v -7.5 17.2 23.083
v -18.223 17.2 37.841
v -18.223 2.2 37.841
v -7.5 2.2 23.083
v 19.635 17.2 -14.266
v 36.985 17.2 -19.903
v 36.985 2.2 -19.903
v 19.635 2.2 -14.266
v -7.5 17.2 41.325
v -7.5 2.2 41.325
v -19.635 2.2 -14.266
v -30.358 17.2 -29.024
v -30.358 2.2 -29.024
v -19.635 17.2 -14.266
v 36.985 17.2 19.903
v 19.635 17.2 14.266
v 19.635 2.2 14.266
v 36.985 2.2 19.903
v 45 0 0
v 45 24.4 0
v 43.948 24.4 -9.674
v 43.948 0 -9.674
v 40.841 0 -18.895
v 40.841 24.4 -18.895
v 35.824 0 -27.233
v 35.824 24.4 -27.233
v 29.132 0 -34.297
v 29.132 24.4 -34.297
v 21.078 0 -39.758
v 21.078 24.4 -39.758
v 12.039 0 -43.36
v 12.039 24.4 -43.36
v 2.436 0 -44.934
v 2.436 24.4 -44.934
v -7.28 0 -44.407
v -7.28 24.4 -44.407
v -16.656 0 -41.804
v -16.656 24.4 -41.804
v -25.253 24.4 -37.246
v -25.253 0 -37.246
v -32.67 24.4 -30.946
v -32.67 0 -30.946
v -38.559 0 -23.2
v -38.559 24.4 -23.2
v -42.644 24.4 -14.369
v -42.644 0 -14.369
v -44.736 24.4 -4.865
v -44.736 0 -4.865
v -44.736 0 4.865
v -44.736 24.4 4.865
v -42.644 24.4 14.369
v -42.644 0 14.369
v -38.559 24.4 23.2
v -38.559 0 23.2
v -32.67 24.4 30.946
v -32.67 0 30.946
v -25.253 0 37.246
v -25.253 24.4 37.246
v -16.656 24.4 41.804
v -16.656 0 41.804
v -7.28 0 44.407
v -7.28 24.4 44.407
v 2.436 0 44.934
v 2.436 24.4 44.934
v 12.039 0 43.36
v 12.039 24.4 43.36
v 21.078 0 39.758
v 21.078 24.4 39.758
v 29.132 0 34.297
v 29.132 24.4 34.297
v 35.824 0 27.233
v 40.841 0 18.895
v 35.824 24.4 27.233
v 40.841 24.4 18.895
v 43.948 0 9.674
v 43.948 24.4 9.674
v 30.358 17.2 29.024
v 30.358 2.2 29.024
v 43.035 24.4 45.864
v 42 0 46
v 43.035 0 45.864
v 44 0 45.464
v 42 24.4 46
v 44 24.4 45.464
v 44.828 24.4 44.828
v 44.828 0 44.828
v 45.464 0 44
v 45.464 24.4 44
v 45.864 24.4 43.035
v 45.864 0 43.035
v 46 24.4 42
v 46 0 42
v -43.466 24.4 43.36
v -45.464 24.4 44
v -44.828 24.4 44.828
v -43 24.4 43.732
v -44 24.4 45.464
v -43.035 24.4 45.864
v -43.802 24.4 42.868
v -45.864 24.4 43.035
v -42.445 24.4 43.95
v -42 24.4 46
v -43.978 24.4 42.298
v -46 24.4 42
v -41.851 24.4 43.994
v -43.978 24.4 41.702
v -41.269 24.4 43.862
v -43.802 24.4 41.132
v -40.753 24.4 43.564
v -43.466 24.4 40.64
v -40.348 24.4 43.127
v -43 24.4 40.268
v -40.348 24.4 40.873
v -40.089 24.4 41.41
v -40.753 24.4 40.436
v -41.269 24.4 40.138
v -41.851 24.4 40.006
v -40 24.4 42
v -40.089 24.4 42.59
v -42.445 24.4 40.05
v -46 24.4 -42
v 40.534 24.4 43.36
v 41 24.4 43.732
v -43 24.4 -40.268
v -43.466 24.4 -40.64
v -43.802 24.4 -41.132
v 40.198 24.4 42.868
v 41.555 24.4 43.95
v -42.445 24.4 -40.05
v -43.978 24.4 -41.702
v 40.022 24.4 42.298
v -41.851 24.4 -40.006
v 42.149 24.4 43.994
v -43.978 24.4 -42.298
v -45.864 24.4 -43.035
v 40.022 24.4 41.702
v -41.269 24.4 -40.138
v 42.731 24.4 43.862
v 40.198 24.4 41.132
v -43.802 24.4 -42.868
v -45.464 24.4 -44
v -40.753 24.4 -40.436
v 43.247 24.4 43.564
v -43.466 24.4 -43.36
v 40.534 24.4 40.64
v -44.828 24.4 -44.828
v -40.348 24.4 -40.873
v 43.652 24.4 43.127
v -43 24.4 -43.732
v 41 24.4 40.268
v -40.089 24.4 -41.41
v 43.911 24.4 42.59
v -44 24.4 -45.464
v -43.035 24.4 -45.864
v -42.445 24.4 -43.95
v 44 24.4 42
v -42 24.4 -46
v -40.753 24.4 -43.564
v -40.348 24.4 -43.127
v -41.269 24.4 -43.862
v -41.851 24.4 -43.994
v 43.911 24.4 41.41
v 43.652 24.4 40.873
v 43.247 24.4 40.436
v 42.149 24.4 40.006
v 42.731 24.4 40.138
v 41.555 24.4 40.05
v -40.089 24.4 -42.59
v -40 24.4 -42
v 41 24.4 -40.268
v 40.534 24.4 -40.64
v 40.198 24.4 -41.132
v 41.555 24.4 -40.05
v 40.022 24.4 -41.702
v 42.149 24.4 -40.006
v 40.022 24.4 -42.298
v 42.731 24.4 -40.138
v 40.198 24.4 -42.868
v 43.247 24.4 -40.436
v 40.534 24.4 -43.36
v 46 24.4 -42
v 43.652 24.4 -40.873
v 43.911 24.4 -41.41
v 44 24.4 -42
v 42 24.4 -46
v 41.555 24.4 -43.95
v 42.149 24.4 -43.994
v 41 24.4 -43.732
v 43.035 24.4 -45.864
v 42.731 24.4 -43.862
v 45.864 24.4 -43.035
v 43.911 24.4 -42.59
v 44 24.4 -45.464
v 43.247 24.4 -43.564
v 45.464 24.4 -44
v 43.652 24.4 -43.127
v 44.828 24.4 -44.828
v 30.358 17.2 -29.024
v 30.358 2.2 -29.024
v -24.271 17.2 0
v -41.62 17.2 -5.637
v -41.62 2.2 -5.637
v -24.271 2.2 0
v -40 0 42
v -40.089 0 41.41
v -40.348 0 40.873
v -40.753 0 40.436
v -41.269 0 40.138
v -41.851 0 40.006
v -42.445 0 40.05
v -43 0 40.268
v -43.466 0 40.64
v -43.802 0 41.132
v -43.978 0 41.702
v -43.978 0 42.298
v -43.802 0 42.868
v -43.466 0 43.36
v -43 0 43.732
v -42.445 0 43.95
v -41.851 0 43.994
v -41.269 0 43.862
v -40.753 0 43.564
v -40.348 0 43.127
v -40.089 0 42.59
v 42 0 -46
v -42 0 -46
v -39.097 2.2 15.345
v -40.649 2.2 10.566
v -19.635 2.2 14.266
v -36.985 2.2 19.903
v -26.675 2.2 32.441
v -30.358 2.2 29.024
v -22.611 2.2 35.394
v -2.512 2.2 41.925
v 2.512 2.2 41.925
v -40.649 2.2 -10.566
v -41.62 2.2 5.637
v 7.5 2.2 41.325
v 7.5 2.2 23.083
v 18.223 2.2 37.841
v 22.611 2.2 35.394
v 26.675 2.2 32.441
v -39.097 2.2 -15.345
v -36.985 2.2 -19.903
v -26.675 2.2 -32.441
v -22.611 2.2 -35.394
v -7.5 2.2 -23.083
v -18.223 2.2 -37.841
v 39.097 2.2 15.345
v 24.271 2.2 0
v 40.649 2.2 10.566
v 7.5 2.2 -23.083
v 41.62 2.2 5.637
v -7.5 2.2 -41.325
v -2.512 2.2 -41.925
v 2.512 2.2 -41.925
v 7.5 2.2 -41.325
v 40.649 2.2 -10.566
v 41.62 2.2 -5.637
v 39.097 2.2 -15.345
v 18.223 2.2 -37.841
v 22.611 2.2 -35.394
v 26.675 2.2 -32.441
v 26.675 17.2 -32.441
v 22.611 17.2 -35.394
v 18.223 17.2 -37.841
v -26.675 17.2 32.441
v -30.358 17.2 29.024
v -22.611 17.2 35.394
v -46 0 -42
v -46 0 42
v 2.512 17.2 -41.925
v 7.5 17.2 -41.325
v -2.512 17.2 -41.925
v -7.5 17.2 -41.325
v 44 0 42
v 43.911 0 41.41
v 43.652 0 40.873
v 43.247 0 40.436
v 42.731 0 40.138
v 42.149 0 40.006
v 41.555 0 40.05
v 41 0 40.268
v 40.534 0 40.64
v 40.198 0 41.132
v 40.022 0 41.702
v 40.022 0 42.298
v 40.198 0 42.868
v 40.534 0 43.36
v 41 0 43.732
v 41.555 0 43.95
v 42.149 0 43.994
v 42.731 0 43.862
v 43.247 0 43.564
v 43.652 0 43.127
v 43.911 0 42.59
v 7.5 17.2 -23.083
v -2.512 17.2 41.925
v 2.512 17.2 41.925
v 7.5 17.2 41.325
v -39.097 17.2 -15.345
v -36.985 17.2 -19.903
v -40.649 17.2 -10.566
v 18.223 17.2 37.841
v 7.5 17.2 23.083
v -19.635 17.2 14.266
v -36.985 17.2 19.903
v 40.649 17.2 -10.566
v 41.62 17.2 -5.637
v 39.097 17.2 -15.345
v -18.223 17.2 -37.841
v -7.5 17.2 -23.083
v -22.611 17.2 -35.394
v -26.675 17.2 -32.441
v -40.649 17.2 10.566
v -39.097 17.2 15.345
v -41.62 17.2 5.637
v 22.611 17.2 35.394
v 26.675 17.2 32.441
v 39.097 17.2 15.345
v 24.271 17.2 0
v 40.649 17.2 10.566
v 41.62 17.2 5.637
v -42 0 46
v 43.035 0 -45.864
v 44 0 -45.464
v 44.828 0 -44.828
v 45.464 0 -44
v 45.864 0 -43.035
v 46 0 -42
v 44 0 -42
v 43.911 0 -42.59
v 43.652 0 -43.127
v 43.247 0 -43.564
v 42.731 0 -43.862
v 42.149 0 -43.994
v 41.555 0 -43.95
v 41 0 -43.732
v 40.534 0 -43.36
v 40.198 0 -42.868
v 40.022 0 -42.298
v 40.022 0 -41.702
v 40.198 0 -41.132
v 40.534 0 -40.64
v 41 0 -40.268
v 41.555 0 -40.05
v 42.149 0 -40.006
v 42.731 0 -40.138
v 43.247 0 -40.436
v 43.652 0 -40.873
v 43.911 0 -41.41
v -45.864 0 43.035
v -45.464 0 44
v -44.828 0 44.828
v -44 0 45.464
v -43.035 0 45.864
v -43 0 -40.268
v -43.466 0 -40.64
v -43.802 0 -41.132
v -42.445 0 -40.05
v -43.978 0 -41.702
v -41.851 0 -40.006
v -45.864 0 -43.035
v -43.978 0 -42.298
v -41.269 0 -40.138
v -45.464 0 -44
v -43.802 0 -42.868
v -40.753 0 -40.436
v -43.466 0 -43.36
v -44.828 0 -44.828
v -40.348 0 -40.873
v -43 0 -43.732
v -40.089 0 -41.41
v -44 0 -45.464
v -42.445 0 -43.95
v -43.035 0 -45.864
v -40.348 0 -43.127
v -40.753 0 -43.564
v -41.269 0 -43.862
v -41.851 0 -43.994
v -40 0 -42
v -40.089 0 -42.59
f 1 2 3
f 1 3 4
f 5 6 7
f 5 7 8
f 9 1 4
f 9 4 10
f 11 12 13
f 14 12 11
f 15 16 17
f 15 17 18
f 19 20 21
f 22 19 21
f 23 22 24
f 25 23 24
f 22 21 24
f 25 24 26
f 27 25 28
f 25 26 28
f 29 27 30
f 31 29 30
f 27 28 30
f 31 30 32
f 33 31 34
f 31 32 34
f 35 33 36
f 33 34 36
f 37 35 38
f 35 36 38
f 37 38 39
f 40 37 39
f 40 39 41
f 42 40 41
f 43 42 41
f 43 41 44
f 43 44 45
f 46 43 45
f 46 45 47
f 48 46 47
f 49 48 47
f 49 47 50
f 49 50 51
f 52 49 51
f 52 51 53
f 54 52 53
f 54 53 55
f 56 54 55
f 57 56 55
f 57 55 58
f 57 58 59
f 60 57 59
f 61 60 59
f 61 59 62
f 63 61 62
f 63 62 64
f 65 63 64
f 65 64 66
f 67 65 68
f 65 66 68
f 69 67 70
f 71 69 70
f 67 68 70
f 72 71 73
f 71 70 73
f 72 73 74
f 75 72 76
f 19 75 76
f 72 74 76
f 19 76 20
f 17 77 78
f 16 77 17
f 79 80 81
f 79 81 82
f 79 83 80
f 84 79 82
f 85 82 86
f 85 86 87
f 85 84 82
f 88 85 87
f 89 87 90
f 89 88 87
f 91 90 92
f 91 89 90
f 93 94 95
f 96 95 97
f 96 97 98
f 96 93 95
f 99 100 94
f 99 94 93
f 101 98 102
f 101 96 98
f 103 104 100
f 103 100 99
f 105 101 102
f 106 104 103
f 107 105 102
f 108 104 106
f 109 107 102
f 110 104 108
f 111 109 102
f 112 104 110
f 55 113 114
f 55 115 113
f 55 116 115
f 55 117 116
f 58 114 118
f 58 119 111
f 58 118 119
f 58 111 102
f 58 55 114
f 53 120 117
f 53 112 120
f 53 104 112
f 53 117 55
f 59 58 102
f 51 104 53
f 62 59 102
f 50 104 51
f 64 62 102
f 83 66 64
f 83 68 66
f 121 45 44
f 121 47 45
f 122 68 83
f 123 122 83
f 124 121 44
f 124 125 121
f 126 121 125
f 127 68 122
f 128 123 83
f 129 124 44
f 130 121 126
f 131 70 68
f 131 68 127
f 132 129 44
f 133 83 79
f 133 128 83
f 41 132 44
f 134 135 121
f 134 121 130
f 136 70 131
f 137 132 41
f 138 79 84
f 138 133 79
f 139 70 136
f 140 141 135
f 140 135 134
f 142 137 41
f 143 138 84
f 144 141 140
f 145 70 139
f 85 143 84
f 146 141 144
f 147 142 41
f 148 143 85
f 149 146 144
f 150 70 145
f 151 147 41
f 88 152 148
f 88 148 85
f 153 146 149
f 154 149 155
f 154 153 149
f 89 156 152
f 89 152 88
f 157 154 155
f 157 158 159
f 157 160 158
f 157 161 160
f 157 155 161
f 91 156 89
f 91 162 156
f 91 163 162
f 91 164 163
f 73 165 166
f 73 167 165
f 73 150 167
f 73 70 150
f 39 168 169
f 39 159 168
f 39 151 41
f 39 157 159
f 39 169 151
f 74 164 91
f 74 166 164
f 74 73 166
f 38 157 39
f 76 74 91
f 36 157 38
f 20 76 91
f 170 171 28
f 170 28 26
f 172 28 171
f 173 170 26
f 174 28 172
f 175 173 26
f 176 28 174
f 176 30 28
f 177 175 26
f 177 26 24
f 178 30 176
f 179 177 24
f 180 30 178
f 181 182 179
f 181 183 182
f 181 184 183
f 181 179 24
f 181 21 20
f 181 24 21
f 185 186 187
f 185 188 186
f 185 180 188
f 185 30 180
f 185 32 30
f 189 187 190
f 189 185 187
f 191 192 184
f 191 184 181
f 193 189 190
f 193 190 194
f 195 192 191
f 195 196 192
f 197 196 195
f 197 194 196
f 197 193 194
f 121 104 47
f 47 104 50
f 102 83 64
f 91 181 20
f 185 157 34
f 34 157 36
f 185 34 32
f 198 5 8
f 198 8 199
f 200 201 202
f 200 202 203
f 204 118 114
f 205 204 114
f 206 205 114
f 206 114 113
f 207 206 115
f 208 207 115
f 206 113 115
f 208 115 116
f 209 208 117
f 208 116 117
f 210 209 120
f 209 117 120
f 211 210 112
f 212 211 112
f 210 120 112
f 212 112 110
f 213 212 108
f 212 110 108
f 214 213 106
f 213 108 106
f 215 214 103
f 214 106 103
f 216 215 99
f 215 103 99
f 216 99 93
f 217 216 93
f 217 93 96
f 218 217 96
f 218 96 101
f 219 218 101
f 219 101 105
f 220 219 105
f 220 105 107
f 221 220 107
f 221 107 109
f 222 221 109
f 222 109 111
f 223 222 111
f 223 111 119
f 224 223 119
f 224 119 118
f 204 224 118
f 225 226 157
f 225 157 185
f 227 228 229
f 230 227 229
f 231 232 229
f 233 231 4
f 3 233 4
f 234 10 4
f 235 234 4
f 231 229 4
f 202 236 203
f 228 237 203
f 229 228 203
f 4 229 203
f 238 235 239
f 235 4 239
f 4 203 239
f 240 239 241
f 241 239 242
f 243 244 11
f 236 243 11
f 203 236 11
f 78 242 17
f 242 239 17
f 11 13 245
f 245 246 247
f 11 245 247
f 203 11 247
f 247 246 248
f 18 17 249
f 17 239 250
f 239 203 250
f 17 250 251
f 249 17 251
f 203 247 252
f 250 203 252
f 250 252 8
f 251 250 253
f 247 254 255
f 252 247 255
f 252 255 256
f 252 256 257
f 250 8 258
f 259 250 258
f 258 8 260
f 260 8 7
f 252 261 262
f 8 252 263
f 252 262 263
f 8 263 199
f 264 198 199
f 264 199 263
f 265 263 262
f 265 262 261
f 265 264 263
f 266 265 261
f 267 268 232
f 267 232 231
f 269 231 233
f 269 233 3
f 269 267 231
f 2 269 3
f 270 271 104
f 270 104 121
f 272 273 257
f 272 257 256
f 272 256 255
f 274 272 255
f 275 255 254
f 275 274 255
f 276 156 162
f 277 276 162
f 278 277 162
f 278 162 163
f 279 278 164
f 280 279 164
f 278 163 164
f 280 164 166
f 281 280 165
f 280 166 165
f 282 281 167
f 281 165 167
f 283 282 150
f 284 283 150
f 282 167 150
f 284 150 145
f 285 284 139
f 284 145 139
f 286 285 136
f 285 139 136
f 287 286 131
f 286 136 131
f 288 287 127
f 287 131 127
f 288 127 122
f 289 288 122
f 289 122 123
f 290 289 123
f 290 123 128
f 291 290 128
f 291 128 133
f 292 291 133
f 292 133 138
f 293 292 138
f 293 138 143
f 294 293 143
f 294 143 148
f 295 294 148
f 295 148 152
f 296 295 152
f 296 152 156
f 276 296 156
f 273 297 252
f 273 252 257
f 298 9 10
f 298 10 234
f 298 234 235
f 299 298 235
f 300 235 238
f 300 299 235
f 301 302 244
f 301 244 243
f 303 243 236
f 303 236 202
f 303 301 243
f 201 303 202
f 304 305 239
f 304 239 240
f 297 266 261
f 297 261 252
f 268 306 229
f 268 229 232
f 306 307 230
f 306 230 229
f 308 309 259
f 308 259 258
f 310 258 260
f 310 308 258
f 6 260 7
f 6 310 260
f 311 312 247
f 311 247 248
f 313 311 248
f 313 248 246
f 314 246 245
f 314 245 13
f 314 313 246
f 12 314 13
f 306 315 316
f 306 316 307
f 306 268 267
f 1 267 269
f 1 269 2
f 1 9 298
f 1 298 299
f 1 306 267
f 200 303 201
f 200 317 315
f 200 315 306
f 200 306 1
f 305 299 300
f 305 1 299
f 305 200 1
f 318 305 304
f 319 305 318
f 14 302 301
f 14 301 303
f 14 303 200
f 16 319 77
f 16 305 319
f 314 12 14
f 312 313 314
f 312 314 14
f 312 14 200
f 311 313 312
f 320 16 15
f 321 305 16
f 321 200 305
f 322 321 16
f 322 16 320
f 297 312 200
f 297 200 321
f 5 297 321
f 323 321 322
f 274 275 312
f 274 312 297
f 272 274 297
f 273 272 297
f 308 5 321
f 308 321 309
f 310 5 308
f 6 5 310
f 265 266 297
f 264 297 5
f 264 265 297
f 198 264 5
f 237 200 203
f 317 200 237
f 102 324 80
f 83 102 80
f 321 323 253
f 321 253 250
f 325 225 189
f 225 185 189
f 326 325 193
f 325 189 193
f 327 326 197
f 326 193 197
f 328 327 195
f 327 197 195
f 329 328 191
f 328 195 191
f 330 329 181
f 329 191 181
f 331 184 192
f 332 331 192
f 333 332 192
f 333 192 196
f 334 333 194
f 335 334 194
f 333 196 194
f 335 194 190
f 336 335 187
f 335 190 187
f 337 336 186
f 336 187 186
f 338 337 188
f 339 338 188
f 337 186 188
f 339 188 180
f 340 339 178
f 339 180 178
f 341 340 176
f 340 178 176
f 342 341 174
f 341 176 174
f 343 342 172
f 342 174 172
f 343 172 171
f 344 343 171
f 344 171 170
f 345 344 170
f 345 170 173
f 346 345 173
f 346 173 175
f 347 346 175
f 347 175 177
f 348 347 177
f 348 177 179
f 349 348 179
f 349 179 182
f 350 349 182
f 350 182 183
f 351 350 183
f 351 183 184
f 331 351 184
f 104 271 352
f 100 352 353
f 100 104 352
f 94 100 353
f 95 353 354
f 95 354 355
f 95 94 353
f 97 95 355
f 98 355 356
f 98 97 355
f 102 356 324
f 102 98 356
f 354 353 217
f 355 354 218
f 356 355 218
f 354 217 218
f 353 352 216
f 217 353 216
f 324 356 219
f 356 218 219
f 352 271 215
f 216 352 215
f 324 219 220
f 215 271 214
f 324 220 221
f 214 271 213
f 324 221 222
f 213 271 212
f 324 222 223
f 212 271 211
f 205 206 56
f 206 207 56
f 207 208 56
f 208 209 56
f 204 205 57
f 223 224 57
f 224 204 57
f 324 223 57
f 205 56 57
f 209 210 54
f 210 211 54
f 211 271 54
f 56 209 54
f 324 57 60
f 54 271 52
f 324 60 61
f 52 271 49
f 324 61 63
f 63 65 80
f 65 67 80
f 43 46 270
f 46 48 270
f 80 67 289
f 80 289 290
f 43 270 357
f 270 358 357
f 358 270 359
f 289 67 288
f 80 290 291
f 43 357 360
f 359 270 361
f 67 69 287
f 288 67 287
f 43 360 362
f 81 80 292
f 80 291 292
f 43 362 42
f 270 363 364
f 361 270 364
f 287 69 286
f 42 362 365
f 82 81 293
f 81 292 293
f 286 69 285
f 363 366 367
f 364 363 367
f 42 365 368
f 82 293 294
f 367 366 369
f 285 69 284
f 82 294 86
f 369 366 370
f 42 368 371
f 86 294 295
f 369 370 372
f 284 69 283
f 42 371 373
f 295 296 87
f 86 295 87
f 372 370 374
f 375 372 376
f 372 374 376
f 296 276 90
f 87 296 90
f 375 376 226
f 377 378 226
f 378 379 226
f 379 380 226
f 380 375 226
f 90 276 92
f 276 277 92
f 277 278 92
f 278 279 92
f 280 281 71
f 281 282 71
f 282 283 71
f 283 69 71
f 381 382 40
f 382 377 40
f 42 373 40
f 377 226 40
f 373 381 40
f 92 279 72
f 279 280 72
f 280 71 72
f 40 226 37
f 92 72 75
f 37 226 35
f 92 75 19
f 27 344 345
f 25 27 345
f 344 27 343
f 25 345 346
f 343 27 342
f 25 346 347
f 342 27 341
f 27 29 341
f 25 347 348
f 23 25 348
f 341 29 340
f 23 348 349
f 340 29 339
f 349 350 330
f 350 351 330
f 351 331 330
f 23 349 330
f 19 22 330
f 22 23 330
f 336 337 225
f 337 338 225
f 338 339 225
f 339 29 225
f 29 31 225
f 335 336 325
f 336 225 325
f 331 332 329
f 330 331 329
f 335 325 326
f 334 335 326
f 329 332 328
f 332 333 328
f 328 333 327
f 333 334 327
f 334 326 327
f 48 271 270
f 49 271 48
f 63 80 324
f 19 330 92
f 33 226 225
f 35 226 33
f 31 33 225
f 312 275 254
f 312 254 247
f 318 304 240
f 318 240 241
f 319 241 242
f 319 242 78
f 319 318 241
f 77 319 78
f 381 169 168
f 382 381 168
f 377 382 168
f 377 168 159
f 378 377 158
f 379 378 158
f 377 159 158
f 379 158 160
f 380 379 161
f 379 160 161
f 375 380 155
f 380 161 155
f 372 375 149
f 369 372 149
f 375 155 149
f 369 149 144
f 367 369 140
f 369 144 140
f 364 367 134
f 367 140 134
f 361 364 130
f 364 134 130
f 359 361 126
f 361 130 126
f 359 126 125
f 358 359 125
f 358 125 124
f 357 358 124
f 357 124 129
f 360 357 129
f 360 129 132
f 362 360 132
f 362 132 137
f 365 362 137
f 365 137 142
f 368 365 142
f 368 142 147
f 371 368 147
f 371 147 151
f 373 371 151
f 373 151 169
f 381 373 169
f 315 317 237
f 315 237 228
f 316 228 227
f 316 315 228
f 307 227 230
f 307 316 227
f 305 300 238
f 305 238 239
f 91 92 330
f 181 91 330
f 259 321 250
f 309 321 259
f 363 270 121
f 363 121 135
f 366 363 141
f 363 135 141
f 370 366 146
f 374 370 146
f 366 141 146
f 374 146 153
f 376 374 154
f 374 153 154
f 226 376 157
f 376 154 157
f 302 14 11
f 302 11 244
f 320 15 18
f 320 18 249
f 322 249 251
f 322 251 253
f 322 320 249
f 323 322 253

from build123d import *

# Parameters (mm, degrees)
ESBO_O1_W                = 92
ESBO_O1_H                = 92
RESSALTO_EXTRUS_O1_DEPTH = 24.4
ESBO_O2_R                = 2
CORTE_EXTRUS_O1_DEPTH    = 25.4
FILETE1_R                = 4
ESBO_O3_R                = 45
CORTE_EXTRUS_O3_DEPTH    = 25.4
RESSALTO_EXTRUS_O2_DEPTH = 15


with BuildPart() as part:
    # Esboço1 → Ressalto-extrusão1 (new body)
    with BuildSketch(Plane(origin=(0, 0, 0), x_dir=(1, 0, 0), z_dir=(0, 1, 0))):
        Rectangle(ESBO_O1_W, ESBO_O1_H)
    extrude(amount=RESSALTO_EXTRUS_O1_DEPTH)

    # Esboço2 → Corte-extrusão1 (cut, through all)
    with BuildSketch(Plane(origin=(0, 24.4, 0), x_dir=(1, 0, 0), z_dir=(0, 1, 0))):
        with Locations((42, 42)):
            Circle(ESBO_O2_R)
        with Locations((-42, 42)):
            Circle(ESBO_O2_R)
        with Locations((42, -42)):
            Circle(ESBO_O2_R)
        with Locations((-42, -42)):
            Circle(ESBO_O2_R)
    extrude(amount=-CORTE_EXTRUS_O1_DEPTH, mode=Mode.SUBTRACT)

    # Filete1
    filete1_edges = [part.edges().sort_by_distance(p)[0] for p in [
        (-46, 12.2, -46),
        (46, 12.2, -46),
        (46, 12.2, 46),
        (-46, 12.2, 46),
    ]]
    fillet(filete1_edges, radius=FILETE1_R)

    # Esboço3 → Corte-extrusão3 (cut, through all)
    with BuildSketch(Plane(origin=(0, 24.4, 0), x_dir=(1, 0, 0), z_dir=(0, 1, 0))):
        Circle(ESBO_O3_R)
    extrude(amount=-CORTE_EXTRUS_O3_DEPTH, mode=Mode.SUBTRACT)


with BuildPart() as body_2:
    # Esboço4 → Ressalto-extrusão2 (new body)
    with BuildSketch(Plane(origin=(0, 17.2, 0), x_dir=(1, 0, 0), z_dir=(0, 1, 0))):
        with BuildLine():
            Line((-7.5, 41.324931942), (-7.5, 23.082626529))
            Line((-7.5, 23.082626529), (-18.22255809, 37.840961625))
            ThreePointArc((-18.22255809, 37.840961625), (-24.686980596, 33.978713764), (-30.357813005, 29.02418284))
            Line((-30.357813005, 29.02418284), (-19.635254916, 14.265847744))
            Line((-19.635254916, 14.265847744), (-36.984718351, 19.903030134))
            ThreePointArc((-36.984718351, 19.903030134), (-39.944373684, 12.978713764), (-41.619973267, 5.637182389))
            Line((-41.619973267, 5.637182389), (-24.270509831, 0))
            Line((-24.270509831, 0), (-41.619973267, -5.637182389))
            ThreePointArc((-41.619973267, -5.637182389), (-39.944373684, -12.978713764), (-36.984718351, -19.903030134))
            Line((-36.984718351, -19.903030134), (-19.635254916, -14.265847744))
            Line((-19.635254916, -14.265847744), (-30.357813005, -29.02418284))
            ThreePointArc((-30.357813005, -29.02418284), (-24.686980596, -33.978713764), (-18.22255809, -37.840961625))
            Line((-18.22255809, -37.840961625), (-7.5, -23.082626529))
            Line((-7.5, -23.082626529), (-7.5, -41.324931942))
            ThreePointArc((-7.5, -41.324931942), (0, -42), (7.5, -41.324931942))
            Line((7.5, -41.324931942), (7.5, -23.082626529))
            Line((7.5, -23.082626529), (18.22255809, -37.840961625))
            ThreePointArc((18.22255809, -37.840961625), (24.686980596, -33.978713764), (30.357813005, -29.02418284))
            Line((30.357813005, -29.02418284), (19.635254916, -14.265847744))
            Line((19.635254916, -14.265847744), (36.984718351, -19.903030134))
            ThreePointArc((36.984718351, -19.903030134), (39.944373684, -12.978713764), (41.619973267, -5.637182389))
            Line((41.619973267, -5.637182389), (24.270509831, 0))
            Line((24.270509831, 0), (41.619973267, 5.637182389))
            ThreePointArc((41.619973267, 5.637182389), (39.944373684, 12.978713764), (36.984718351, 19.903030134))
            Line((36.984718351, 19.903030134), (19.635254916, 14.265847744))
            Line((19.635254916, 14.265847744), (30.357813005, 29.02418284))
            ThreePointArc((30.357813005, 29.02418284), (24.686980596, 33.978713764), (18.22255809, 37.840961625))
            Line((18.22255809, 37.840961625), (7.5, 23.082626529))
            Line((7.5, 23.082626529), (7.5, 41.324931942))
            ThreePointArc((7.5, 41.324931942), (0, 42), (-7.5, 41.324931942))
        make_face()
    extrude(amount=-RESSALTO_EXTRUS_O2_DEPTH)


solid = Compound([part.part, body_2.part])
